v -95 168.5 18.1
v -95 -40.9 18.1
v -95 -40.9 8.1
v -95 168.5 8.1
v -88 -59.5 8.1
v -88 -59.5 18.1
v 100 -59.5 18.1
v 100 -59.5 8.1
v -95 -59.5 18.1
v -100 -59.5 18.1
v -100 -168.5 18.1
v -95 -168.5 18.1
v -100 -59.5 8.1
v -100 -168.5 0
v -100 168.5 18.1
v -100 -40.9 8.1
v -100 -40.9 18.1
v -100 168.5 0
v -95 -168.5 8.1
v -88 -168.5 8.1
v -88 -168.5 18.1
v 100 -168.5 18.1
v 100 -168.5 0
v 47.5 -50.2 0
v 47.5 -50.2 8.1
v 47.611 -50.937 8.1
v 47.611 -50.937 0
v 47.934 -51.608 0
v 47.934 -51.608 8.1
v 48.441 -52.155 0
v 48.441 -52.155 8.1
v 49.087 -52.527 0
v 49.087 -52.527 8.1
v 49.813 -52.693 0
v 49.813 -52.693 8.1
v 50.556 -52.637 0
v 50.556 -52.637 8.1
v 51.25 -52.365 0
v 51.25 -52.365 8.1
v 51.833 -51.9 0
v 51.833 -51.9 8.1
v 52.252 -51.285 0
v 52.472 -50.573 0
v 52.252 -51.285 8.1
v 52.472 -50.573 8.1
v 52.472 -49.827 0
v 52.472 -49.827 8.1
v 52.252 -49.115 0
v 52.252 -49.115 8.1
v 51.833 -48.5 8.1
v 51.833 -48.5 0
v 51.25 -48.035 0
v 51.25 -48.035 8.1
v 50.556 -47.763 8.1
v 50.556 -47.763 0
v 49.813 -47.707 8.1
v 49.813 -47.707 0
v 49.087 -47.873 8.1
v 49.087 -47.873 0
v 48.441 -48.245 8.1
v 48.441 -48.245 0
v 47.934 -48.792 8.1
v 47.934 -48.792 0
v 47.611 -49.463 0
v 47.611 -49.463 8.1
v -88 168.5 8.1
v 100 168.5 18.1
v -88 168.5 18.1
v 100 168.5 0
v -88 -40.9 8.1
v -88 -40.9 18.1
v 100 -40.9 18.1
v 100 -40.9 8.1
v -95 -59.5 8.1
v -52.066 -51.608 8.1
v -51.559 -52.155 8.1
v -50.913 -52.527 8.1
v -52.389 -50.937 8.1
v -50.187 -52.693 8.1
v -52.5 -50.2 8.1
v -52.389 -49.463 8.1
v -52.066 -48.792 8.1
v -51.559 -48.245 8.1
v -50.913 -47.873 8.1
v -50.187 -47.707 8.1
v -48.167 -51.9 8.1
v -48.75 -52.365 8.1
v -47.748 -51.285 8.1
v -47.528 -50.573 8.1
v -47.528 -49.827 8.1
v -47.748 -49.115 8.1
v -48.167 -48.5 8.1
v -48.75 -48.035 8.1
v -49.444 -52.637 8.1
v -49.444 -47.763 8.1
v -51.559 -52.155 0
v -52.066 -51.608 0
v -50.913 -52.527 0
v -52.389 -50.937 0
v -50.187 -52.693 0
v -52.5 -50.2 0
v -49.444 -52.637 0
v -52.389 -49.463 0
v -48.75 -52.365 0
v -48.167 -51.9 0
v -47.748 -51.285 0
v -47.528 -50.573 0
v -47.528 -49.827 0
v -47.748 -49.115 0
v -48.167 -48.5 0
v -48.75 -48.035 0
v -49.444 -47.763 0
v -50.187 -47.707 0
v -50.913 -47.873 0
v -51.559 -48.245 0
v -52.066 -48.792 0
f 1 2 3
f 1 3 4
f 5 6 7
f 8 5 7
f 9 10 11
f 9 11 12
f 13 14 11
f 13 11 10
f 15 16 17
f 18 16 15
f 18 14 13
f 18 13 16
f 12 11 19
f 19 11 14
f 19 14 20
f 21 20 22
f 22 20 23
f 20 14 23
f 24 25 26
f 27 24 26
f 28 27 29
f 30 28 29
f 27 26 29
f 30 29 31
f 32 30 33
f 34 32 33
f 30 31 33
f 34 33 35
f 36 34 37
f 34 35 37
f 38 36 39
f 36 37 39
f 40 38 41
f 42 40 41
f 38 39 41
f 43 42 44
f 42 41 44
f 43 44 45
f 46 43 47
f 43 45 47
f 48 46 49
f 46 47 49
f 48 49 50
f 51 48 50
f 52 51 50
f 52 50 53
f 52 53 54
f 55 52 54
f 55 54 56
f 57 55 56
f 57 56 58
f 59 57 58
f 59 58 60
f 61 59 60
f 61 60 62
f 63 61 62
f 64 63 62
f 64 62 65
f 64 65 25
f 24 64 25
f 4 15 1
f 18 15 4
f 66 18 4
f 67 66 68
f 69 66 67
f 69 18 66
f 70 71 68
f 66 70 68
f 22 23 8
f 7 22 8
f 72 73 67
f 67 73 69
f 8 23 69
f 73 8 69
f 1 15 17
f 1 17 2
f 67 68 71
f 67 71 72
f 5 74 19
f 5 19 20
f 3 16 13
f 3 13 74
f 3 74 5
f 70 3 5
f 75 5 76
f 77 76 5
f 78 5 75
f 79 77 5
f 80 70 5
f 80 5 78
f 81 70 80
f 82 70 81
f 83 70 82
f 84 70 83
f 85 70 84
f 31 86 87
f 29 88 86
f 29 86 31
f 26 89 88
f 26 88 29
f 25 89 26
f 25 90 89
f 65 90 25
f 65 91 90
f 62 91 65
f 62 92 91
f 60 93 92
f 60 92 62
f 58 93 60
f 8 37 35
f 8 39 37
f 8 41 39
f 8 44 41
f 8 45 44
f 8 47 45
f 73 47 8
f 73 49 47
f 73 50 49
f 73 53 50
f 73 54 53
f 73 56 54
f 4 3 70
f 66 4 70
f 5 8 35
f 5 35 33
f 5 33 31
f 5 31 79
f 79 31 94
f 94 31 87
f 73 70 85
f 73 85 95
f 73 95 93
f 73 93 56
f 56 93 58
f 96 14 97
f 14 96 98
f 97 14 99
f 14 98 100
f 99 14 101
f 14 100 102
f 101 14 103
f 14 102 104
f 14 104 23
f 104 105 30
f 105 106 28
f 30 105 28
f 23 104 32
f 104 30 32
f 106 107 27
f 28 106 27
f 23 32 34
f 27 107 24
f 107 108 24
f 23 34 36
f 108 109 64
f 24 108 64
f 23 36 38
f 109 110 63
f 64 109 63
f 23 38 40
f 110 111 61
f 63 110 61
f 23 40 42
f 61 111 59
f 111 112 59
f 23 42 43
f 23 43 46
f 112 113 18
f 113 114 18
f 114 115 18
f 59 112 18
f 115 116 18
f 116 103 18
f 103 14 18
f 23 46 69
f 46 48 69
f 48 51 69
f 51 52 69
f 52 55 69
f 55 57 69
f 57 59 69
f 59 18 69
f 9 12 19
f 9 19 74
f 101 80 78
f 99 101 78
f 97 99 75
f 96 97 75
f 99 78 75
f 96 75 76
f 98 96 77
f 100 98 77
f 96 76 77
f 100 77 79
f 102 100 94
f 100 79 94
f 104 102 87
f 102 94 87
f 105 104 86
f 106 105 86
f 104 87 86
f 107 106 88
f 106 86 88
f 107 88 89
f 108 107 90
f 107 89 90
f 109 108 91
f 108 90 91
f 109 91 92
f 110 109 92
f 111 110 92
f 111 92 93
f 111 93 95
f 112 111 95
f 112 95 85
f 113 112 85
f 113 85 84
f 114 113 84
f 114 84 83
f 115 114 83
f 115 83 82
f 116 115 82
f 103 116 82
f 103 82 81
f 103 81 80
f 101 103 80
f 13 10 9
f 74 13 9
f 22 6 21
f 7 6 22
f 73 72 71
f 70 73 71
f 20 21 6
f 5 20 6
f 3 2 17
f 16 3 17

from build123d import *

# Parameters (mm, degrees)
F0_W     = 200
F0_H     = 337
F1_DEPTH = 18.1
F2_W     = 25
F2_H     = 18.6
F2_W_2   = 150
F3_DEPTH = 10
F5_DEPTH = 25
F6_W     = 7
F6_H     = 209.4
F7_DEPTH = 10
F8_W     = 7
F8_H     = 109
F9_DEPTH = 10


with BuildPart() as f1:
    # F0 (on Top) → F1 (new body)
    with BuildSketch(Plane.XY):
        Rectangle(F0_W, F0_H)
    extrude(amount=F1_DEPTH)

    # F2 (on face) → F3 (cut)
    with BuildSketch(Plane.XY.offset(18.1)):
        with Locations((-87.5, -50.2)):
            Rectangle(F2_W, F2_H)
        with Locations((-62.5, -50.2)):
            Rectangle(F2_W, F2_H)
        with Locations((25, -50.2)):
            Rectangle(F2_W_2, F2_H)
        with Locations((112.5, -50.2)):
            Rectangle(F2_W, F2_H)
        with Locations((137.5, -50.2)):
            Rectangle(F2_W, F2_H)
    extrude(amount=-F3_DEPTH, mode=Mode.SUBTRACT)

    # F4 (on face) → F5 (cut)
    with BuildSketch(Plane.XY.offset(8.1)):
        with BuildLine():
            Line((-52.5, -50.2), (-50, -50.2))
            Line((-50, -50.2), (-47.5, -50.2))
            ThreePointArc((-47.5, -50.2), (-50, -47.7), (-52.5, -50.2))
        make_face()
        with BuildLine():
            Line((-47.5, -50.2), (-50, -50.2))
            Line((-50, -50.2), (-52.5, -50.2))
            ThreePointArc((-52.5, -50.2), (-50, -52.7), (-47.5, -50.2))
        make_face()
        with BuildLine():
            ThreePointArc((52.5, -50.2), (50, -47.7), (47.5, -50.2))
            Line((47.5, -50.2), (50, -50.2))
            Line((50, -50.2), (52.5, -50.2))
        make_face()
        with BuildLine():
            Line((50, -50.2), (47.5, -50.2))
            ThreePointArc((47.5, -50.2), (50, -52.7), (52.5, -50.2))
            Line((52.5, -50.2), (50, -50.2))
        make_face()
    extrude(amount=-F5_DEPTH, mode=Mode.SUBTRACT)

    # F6 (on face) → F7 (cut)
    with BuildSketch(Plane.XY.offset(18.1)):
        with Locations((-91.5, 63.8)):
            Rectangle(F6_W, F6_H)
    extrude(amount=-F7_DEPTH, mode=Mode.SUBTRACT)

    # F8 (on face) → F9 (cut)
    with BuildSketch(Plane.XY.offset(18.1)):
        with Locations((-91.5, -114)):
            Rectangle(F8_W, F8_H)
    extrude(amount=-F9_DEPTH, mode=Mode.SUBTRACT)


solid = f1.part
